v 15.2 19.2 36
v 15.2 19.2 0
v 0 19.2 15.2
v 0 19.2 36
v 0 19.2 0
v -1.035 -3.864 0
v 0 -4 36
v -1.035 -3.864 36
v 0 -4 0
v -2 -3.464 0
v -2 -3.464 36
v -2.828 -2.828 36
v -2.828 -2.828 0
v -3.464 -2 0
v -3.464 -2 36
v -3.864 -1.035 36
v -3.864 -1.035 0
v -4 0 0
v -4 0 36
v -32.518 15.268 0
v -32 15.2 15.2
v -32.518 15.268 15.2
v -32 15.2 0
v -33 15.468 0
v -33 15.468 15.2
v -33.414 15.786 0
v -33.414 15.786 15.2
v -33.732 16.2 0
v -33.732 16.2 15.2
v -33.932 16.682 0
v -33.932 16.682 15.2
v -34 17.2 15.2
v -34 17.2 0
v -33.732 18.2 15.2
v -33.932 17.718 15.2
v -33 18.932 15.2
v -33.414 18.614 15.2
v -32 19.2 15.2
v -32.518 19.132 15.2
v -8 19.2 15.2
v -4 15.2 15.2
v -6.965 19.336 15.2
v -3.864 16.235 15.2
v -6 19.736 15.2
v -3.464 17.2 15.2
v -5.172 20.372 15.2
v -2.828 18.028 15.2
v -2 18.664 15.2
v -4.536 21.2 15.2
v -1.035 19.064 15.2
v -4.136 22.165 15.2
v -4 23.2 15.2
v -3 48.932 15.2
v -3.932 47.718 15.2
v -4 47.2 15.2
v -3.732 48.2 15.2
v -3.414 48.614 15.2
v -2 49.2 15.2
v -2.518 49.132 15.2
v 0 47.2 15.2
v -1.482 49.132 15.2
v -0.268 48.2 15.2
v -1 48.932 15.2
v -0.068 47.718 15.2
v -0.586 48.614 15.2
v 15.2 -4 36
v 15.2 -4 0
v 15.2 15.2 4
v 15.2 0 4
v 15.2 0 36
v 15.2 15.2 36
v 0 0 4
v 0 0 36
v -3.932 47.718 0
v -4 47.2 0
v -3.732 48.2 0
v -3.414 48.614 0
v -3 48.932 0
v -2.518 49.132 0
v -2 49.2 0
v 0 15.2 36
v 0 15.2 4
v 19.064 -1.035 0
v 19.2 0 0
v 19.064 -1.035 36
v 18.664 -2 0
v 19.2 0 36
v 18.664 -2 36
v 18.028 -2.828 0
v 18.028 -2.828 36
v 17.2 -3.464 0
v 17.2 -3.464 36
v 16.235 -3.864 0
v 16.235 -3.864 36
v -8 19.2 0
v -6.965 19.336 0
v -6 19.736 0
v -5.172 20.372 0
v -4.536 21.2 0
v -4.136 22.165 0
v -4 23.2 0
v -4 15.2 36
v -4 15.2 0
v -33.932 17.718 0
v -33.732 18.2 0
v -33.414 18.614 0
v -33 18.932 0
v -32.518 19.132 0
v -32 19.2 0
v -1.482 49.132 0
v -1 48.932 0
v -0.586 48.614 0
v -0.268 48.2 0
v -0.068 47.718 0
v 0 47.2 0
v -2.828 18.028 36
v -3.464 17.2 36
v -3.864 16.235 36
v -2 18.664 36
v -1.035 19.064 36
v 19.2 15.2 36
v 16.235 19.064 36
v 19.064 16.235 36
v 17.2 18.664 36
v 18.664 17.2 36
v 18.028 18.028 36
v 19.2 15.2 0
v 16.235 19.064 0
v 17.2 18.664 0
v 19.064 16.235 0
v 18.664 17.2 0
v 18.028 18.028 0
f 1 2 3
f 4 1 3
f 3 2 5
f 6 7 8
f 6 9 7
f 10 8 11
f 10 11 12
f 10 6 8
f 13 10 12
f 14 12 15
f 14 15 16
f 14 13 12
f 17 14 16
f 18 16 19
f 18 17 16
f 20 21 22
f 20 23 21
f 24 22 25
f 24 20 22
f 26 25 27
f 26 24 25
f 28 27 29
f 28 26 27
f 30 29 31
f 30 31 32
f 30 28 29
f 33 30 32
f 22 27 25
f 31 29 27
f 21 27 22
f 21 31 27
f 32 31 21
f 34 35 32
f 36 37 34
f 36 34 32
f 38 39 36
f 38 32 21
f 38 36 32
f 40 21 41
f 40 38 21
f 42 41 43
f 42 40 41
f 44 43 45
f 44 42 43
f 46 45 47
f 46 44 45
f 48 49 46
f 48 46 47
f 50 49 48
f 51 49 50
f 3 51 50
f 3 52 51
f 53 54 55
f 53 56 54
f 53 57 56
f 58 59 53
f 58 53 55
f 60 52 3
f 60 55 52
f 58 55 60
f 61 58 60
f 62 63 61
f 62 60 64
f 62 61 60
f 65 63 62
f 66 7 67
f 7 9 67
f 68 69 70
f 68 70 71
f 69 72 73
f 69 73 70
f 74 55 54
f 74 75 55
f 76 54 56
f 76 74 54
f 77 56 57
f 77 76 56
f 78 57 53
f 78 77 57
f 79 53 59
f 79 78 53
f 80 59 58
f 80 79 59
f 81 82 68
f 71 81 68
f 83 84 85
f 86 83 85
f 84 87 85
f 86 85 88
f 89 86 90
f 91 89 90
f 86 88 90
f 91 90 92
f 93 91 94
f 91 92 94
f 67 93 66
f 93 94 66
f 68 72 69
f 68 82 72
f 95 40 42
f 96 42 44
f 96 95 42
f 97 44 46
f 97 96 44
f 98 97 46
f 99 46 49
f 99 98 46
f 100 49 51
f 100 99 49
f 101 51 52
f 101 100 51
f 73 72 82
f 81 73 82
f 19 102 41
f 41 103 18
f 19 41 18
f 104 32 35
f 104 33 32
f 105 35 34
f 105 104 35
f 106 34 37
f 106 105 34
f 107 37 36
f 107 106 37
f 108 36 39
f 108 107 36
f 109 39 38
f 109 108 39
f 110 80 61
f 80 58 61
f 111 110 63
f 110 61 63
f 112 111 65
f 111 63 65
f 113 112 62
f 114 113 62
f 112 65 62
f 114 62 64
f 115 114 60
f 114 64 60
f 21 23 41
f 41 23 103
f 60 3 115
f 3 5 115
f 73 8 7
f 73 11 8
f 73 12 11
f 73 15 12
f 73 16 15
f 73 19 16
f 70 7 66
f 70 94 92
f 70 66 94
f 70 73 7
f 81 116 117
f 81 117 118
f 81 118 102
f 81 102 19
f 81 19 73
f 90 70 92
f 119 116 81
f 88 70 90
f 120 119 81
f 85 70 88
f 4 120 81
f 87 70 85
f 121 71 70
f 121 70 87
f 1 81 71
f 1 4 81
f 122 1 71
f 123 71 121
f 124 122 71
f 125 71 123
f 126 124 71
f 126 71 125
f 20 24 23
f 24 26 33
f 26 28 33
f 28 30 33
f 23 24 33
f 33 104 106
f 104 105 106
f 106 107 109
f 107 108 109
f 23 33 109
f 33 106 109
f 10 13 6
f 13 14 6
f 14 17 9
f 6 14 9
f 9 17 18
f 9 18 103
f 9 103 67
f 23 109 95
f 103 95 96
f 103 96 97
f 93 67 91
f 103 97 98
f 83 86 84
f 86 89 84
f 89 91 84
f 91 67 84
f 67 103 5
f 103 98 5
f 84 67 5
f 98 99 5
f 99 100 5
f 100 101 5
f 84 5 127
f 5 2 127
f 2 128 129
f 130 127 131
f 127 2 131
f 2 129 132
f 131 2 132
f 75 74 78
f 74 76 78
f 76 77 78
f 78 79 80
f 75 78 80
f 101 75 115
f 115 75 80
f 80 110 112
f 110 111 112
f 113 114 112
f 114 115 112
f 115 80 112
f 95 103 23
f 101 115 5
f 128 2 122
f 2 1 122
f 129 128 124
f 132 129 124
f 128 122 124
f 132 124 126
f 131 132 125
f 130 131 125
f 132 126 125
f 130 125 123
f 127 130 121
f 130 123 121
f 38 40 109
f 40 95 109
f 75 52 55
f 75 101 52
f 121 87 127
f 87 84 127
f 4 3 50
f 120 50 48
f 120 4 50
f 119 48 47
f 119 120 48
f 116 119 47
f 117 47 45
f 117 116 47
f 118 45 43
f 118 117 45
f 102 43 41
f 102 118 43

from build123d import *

# Parameters (mm, degrees)
F0_W     = 15.2
F0_H     = 15.2
F0_W_2   = 30
F0_H_2   = 4
F0_W_3   = 4
F0_H_3   = 30
F1_DEPTH = 4
F2_DEPTH = 36
F3_DEPTH = 15.2
F4_R     = 3.99999
F6_R     = 1.99999


# Not quite as in the source:
# - a fillet or chamfer is up to 0.001 mm smaller than in the source, because OpenCascade refuses the exact size
# - a feature of the source that left no trace in its solid (it failed there, or was rolled back) is left out


with BuildPart() as f1:
    # F0 (on Top) → F1 (new body)
    with BuildSketch(Plane.XY):
        Polygon((-4, 15.2), (-4, -4), (19.2, -4), (19.2, 19.2), (0, 19.2), (-4, 19.2), align=None)
        with Locations((7.6, 7.6)):
            Rectangle(F0_W, F0_H, mode=Mode.SUBTRACT)
        with Locations((-19, 17.2)):
            Rectangle(F0_W_2, F0_H_2)
        with Locations((-2, 34.2)):
            Rectangle(F0_W_3, F0_H_3)
        with Locations((7.6, 7.6)):
            Rectangle(F0_W, F0_H)
    extrude(amount=F1_DEPTH)

    # F0 (on Top) → F2 (join)
    with BuildSketch(Plane.XY):
        Polygon((-4, 15.2), (-4, -4), (19.2, -4), (19.2, 19.2), (0, 19.2), (-4, 19.2), align=None)
        with Locations((7.6, 7.6)):
            Rectangle(F0_W, F0_H, mode=Mode.SUBTRACT)
    extrude(amount=F2_DEPTH)

    # F0 (on Top) → F3 (join)
    with BuildSketch(Plane.XY):
        with Locations((-19, 17.2)):
            Rectangle(F0_W_2, F0_H_2)
        with Locations((-2, 34.2)):
            Rectangle(F0_W_3, F0_H_3)
    extrude(amount=F3_DEPTH)

    # F4 (radius 4 in the source; OpenCascade refuses exactly that, so slightly less here)
    f4_edges = [f1.edges().sort_by_distance(p)[0] for p in [
        (-4, -4, 18),
        (19.2, -4, 18),
        (19.2, 19.2, 18),
        (-4, 19.2, 7.6),
        (-4, 19.2, 25.6),
    ]]
    fillet(f4_edges, radius=F4_R)

    # F6 (radius 2 in the source; OpenCascade refuses exactly that, so slightly less here)
    f6_edges = [f1.edges().sort_by_distance(p)[0] for p in [
        (0, 49.2, 7.6),
        (-4, 49.2, 7.6),
        (-34, 19.2, 7.6),
        (-34, 15.2, 7.6),
    ]]
    fillet(f6_edges, radius=F6_R)


solid = f1.part
